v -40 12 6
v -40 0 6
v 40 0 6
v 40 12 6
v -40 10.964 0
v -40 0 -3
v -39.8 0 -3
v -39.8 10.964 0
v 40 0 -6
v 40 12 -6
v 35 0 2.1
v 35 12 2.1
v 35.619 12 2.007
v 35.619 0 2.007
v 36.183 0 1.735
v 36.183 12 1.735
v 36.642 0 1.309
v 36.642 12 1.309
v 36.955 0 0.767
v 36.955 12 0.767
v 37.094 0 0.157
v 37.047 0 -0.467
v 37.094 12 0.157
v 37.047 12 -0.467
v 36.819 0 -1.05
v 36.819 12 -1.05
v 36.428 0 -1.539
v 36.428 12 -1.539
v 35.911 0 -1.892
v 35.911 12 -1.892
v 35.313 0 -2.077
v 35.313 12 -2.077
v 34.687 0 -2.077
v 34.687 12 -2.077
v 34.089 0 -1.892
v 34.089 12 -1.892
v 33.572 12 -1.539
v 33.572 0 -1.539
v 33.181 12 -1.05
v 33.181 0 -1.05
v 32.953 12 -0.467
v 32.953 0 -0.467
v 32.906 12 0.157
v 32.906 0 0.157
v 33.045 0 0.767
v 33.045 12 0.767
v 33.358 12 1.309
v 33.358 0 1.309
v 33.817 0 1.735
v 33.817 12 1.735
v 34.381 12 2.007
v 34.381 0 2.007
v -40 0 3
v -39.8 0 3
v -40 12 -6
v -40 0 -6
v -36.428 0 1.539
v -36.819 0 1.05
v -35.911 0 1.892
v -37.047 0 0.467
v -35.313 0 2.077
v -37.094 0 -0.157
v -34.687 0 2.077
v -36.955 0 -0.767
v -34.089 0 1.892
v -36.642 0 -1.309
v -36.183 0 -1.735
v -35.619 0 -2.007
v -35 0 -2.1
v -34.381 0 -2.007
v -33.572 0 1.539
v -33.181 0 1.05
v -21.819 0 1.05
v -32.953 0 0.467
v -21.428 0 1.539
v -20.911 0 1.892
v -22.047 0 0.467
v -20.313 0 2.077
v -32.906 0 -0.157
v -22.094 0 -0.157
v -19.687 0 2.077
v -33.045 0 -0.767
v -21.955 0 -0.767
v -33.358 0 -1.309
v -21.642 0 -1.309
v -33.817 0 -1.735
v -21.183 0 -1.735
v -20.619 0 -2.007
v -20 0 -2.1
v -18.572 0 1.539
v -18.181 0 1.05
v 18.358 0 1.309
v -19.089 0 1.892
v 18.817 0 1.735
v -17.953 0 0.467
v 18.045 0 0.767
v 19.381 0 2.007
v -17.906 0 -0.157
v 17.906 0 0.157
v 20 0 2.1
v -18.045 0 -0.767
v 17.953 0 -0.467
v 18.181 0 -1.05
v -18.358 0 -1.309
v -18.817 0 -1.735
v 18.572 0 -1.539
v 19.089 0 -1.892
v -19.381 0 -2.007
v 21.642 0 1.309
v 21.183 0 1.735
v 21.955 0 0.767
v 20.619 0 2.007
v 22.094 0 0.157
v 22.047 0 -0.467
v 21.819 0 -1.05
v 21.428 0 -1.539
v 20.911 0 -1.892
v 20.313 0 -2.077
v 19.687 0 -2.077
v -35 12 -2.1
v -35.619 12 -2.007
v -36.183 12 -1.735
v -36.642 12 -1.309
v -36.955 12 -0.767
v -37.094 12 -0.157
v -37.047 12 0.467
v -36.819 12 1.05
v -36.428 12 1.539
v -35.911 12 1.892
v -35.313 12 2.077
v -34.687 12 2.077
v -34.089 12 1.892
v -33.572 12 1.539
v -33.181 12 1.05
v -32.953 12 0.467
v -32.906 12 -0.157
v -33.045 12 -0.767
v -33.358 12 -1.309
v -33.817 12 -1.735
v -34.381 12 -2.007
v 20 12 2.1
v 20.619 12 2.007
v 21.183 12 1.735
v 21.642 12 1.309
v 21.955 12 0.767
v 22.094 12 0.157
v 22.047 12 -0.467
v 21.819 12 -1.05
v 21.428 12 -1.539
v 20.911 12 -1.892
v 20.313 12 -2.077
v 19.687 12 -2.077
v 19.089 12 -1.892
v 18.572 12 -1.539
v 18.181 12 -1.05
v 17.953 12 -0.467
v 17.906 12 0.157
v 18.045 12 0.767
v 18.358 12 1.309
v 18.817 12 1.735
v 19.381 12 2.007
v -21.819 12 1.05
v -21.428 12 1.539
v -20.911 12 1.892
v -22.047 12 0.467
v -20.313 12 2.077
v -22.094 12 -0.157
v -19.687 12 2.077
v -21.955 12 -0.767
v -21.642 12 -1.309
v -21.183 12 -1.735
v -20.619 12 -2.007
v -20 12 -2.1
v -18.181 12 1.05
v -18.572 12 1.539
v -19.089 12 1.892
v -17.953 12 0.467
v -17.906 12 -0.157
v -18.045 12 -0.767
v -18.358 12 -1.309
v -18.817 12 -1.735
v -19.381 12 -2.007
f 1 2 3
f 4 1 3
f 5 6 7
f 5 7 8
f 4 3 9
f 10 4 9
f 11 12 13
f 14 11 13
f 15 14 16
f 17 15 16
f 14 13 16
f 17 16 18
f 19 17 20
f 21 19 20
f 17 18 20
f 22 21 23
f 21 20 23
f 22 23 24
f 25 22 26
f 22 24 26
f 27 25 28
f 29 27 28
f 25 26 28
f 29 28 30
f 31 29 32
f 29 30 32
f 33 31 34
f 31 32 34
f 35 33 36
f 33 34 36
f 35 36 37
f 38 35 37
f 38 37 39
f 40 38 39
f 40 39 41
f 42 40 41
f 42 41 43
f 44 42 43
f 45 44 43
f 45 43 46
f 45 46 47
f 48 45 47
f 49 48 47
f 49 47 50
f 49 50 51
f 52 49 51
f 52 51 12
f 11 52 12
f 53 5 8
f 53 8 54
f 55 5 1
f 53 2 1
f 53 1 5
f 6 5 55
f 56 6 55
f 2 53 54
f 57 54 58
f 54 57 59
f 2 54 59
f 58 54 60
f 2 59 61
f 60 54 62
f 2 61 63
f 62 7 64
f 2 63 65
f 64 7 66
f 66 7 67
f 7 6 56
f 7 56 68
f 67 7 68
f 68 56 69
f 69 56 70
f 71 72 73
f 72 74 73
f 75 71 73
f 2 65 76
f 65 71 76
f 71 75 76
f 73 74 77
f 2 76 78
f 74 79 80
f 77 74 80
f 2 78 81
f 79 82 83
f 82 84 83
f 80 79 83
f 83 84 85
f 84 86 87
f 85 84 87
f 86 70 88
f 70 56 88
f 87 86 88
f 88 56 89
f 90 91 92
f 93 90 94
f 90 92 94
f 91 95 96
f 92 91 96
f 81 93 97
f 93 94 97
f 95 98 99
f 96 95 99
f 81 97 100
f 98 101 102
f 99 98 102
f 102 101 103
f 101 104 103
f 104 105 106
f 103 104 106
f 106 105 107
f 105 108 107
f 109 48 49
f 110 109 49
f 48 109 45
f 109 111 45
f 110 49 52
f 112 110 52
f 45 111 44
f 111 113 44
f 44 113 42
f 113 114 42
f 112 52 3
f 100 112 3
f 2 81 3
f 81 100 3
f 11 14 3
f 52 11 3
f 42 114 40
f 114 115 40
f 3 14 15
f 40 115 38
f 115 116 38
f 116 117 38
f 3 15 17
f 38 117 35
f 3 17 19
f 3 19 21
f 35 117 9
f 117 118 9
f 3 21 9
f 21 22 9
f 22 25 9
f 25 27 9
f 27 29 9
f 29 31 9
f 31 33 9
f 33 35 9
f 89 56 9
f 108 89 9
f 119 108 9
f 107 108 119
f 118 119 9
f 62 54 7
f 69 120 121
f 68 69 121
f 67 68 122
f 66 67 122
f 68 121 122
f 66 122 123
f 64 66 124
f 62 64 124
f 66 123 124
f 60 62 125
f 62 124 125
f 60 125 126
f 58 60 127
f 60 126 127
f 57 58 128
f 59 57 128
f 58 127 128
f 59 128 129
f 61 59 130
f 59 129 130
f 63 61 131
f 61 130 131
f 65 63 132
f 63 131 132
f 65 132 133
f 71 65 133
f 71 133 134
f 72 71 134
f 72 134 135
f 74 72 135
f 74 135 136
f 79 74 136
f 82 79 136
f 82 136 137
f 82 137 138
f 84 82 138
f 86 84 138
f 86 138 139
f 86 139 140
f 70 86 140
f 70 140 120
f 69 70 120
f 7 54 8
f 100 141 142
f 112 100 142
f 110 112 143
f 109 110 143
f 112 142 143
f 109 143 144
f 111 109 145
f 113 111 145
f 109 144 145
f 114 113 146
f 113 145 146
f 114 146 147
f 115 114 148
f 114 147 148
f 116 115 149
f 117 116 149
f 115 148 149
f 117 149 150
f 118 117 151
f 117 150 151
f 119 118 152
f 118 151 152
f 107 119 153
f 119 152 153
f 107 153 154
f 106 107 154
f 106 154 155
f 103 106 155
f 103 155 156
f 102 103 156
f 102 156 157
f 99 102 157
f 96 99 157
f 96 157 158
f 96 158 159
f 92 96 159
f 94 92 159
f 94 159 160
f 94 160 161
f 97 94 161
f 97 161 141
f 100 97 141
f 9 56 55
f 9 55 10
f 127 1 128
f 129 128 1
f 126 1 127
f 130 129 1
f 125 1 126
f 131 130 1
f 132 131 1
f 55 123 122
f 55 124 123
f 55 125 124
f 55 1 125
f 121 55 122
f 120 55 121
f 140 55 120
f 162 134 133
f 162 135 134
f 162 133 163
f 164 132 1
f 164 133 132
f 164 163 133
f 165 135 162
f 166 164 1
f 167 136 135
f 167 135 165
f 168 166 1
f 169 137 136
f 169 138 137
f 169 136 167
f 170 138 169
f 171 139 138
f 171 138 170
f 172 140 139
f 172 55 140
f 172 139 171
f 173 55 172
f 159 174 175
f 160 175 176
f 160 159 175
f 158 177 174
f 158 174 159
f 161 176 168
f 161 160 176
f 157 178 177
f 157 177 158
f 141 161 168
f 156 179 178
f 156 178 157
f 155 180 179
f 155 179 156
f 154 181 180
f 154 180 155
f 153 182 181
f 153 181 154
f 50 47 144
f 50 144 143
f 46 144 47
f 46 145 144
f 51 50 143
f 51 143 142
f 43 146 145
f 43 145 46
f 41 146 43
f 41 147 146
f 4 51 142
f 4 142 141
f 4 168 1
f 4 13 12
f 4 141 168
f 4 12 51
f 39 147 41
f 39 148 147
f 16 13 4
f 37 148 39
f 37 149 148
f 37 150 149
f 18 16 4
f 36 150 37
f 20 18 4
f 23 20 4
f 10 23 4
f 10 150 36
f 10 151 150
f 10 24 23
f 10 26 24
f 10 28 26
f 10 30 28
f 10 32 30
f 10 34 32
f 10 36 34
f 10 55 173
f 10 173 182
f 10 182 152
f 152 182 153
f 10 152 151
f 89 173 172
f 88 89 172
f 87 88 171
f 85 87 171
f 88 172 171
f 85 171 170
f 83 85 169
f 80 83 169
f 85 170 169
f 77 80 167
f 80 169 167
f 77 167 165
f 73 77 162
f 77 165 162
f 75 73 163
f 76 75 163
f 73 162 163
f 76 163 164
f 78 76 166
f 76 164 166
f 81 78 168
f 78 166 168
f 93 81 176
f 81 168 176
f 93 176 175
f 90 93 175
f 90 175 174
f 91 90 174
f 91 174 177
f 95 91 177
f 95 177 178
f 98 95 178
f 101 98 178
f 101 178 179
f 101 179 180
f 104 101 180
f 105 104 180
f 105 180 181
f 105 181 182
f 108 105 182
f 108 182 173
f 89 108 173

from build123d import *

# Parameters (mm, degrees)
SKETCH1_W           = 80
SKETCH1_H           = 12
BOSS_EXTRUDE1_DEPTH = 12
SKETCH2_R           = 2.1
CUT_EXTRUDE1_DEPTH  = 43.190046219
CUT_EXTRUDE8_DEPTH  = 0.2


with BuildPart() as part:
    # Sketch1 → Boss-Extrude1 (new body)
    with BuildSketch(Plane(origin=(0, 0, 0), x_dir=(1, 0, 0), z_dir=(0, 1, 0))):
        Rectangle(SKETCH1_W, SKETCH1_H)
    extrude(amount=BOSS_EXTRUDE1_DEPTH)

    # Sketch2 → Cut-Extrude1 (cut, through all)
    with BuildSketch(Plane(origin=(0, 12, 0), x_dir=(1, 0, 0), z_dir=(0, 1, 0))):
        with Locations(Location((35, 0, 0), (0, 0, 270))):
            Circle(SKETCH2_R)
        with Locations(Location((20, 0, 0), (0, 0, 270))):
            Circle(SKETCH2_R)
        with Locations(Location((-20, 0, 0), (0, 0, 90))):
            Circle(SKETCH2_R)
        with Locations(Location((-35, 0, 0), (0, 0, 90))):
            Circle(SKETCH2_R)
    extrude(amount=-CUT_EXTRUDE1_DEPTH, mode=Mode.SUBTRACT)

    # Sketch3 → Cut-Extrude8 (cut)
    with BuildSketch(Plane.ZY.offset(40)):
        Polygon((-3, 0), (0, 10.963509299), (3, 0), align=None)
    extrude(amount=-CUT_EXTRUDE8_DEPTH, mode=Mode.SUBTRACT)


solid = part.part
